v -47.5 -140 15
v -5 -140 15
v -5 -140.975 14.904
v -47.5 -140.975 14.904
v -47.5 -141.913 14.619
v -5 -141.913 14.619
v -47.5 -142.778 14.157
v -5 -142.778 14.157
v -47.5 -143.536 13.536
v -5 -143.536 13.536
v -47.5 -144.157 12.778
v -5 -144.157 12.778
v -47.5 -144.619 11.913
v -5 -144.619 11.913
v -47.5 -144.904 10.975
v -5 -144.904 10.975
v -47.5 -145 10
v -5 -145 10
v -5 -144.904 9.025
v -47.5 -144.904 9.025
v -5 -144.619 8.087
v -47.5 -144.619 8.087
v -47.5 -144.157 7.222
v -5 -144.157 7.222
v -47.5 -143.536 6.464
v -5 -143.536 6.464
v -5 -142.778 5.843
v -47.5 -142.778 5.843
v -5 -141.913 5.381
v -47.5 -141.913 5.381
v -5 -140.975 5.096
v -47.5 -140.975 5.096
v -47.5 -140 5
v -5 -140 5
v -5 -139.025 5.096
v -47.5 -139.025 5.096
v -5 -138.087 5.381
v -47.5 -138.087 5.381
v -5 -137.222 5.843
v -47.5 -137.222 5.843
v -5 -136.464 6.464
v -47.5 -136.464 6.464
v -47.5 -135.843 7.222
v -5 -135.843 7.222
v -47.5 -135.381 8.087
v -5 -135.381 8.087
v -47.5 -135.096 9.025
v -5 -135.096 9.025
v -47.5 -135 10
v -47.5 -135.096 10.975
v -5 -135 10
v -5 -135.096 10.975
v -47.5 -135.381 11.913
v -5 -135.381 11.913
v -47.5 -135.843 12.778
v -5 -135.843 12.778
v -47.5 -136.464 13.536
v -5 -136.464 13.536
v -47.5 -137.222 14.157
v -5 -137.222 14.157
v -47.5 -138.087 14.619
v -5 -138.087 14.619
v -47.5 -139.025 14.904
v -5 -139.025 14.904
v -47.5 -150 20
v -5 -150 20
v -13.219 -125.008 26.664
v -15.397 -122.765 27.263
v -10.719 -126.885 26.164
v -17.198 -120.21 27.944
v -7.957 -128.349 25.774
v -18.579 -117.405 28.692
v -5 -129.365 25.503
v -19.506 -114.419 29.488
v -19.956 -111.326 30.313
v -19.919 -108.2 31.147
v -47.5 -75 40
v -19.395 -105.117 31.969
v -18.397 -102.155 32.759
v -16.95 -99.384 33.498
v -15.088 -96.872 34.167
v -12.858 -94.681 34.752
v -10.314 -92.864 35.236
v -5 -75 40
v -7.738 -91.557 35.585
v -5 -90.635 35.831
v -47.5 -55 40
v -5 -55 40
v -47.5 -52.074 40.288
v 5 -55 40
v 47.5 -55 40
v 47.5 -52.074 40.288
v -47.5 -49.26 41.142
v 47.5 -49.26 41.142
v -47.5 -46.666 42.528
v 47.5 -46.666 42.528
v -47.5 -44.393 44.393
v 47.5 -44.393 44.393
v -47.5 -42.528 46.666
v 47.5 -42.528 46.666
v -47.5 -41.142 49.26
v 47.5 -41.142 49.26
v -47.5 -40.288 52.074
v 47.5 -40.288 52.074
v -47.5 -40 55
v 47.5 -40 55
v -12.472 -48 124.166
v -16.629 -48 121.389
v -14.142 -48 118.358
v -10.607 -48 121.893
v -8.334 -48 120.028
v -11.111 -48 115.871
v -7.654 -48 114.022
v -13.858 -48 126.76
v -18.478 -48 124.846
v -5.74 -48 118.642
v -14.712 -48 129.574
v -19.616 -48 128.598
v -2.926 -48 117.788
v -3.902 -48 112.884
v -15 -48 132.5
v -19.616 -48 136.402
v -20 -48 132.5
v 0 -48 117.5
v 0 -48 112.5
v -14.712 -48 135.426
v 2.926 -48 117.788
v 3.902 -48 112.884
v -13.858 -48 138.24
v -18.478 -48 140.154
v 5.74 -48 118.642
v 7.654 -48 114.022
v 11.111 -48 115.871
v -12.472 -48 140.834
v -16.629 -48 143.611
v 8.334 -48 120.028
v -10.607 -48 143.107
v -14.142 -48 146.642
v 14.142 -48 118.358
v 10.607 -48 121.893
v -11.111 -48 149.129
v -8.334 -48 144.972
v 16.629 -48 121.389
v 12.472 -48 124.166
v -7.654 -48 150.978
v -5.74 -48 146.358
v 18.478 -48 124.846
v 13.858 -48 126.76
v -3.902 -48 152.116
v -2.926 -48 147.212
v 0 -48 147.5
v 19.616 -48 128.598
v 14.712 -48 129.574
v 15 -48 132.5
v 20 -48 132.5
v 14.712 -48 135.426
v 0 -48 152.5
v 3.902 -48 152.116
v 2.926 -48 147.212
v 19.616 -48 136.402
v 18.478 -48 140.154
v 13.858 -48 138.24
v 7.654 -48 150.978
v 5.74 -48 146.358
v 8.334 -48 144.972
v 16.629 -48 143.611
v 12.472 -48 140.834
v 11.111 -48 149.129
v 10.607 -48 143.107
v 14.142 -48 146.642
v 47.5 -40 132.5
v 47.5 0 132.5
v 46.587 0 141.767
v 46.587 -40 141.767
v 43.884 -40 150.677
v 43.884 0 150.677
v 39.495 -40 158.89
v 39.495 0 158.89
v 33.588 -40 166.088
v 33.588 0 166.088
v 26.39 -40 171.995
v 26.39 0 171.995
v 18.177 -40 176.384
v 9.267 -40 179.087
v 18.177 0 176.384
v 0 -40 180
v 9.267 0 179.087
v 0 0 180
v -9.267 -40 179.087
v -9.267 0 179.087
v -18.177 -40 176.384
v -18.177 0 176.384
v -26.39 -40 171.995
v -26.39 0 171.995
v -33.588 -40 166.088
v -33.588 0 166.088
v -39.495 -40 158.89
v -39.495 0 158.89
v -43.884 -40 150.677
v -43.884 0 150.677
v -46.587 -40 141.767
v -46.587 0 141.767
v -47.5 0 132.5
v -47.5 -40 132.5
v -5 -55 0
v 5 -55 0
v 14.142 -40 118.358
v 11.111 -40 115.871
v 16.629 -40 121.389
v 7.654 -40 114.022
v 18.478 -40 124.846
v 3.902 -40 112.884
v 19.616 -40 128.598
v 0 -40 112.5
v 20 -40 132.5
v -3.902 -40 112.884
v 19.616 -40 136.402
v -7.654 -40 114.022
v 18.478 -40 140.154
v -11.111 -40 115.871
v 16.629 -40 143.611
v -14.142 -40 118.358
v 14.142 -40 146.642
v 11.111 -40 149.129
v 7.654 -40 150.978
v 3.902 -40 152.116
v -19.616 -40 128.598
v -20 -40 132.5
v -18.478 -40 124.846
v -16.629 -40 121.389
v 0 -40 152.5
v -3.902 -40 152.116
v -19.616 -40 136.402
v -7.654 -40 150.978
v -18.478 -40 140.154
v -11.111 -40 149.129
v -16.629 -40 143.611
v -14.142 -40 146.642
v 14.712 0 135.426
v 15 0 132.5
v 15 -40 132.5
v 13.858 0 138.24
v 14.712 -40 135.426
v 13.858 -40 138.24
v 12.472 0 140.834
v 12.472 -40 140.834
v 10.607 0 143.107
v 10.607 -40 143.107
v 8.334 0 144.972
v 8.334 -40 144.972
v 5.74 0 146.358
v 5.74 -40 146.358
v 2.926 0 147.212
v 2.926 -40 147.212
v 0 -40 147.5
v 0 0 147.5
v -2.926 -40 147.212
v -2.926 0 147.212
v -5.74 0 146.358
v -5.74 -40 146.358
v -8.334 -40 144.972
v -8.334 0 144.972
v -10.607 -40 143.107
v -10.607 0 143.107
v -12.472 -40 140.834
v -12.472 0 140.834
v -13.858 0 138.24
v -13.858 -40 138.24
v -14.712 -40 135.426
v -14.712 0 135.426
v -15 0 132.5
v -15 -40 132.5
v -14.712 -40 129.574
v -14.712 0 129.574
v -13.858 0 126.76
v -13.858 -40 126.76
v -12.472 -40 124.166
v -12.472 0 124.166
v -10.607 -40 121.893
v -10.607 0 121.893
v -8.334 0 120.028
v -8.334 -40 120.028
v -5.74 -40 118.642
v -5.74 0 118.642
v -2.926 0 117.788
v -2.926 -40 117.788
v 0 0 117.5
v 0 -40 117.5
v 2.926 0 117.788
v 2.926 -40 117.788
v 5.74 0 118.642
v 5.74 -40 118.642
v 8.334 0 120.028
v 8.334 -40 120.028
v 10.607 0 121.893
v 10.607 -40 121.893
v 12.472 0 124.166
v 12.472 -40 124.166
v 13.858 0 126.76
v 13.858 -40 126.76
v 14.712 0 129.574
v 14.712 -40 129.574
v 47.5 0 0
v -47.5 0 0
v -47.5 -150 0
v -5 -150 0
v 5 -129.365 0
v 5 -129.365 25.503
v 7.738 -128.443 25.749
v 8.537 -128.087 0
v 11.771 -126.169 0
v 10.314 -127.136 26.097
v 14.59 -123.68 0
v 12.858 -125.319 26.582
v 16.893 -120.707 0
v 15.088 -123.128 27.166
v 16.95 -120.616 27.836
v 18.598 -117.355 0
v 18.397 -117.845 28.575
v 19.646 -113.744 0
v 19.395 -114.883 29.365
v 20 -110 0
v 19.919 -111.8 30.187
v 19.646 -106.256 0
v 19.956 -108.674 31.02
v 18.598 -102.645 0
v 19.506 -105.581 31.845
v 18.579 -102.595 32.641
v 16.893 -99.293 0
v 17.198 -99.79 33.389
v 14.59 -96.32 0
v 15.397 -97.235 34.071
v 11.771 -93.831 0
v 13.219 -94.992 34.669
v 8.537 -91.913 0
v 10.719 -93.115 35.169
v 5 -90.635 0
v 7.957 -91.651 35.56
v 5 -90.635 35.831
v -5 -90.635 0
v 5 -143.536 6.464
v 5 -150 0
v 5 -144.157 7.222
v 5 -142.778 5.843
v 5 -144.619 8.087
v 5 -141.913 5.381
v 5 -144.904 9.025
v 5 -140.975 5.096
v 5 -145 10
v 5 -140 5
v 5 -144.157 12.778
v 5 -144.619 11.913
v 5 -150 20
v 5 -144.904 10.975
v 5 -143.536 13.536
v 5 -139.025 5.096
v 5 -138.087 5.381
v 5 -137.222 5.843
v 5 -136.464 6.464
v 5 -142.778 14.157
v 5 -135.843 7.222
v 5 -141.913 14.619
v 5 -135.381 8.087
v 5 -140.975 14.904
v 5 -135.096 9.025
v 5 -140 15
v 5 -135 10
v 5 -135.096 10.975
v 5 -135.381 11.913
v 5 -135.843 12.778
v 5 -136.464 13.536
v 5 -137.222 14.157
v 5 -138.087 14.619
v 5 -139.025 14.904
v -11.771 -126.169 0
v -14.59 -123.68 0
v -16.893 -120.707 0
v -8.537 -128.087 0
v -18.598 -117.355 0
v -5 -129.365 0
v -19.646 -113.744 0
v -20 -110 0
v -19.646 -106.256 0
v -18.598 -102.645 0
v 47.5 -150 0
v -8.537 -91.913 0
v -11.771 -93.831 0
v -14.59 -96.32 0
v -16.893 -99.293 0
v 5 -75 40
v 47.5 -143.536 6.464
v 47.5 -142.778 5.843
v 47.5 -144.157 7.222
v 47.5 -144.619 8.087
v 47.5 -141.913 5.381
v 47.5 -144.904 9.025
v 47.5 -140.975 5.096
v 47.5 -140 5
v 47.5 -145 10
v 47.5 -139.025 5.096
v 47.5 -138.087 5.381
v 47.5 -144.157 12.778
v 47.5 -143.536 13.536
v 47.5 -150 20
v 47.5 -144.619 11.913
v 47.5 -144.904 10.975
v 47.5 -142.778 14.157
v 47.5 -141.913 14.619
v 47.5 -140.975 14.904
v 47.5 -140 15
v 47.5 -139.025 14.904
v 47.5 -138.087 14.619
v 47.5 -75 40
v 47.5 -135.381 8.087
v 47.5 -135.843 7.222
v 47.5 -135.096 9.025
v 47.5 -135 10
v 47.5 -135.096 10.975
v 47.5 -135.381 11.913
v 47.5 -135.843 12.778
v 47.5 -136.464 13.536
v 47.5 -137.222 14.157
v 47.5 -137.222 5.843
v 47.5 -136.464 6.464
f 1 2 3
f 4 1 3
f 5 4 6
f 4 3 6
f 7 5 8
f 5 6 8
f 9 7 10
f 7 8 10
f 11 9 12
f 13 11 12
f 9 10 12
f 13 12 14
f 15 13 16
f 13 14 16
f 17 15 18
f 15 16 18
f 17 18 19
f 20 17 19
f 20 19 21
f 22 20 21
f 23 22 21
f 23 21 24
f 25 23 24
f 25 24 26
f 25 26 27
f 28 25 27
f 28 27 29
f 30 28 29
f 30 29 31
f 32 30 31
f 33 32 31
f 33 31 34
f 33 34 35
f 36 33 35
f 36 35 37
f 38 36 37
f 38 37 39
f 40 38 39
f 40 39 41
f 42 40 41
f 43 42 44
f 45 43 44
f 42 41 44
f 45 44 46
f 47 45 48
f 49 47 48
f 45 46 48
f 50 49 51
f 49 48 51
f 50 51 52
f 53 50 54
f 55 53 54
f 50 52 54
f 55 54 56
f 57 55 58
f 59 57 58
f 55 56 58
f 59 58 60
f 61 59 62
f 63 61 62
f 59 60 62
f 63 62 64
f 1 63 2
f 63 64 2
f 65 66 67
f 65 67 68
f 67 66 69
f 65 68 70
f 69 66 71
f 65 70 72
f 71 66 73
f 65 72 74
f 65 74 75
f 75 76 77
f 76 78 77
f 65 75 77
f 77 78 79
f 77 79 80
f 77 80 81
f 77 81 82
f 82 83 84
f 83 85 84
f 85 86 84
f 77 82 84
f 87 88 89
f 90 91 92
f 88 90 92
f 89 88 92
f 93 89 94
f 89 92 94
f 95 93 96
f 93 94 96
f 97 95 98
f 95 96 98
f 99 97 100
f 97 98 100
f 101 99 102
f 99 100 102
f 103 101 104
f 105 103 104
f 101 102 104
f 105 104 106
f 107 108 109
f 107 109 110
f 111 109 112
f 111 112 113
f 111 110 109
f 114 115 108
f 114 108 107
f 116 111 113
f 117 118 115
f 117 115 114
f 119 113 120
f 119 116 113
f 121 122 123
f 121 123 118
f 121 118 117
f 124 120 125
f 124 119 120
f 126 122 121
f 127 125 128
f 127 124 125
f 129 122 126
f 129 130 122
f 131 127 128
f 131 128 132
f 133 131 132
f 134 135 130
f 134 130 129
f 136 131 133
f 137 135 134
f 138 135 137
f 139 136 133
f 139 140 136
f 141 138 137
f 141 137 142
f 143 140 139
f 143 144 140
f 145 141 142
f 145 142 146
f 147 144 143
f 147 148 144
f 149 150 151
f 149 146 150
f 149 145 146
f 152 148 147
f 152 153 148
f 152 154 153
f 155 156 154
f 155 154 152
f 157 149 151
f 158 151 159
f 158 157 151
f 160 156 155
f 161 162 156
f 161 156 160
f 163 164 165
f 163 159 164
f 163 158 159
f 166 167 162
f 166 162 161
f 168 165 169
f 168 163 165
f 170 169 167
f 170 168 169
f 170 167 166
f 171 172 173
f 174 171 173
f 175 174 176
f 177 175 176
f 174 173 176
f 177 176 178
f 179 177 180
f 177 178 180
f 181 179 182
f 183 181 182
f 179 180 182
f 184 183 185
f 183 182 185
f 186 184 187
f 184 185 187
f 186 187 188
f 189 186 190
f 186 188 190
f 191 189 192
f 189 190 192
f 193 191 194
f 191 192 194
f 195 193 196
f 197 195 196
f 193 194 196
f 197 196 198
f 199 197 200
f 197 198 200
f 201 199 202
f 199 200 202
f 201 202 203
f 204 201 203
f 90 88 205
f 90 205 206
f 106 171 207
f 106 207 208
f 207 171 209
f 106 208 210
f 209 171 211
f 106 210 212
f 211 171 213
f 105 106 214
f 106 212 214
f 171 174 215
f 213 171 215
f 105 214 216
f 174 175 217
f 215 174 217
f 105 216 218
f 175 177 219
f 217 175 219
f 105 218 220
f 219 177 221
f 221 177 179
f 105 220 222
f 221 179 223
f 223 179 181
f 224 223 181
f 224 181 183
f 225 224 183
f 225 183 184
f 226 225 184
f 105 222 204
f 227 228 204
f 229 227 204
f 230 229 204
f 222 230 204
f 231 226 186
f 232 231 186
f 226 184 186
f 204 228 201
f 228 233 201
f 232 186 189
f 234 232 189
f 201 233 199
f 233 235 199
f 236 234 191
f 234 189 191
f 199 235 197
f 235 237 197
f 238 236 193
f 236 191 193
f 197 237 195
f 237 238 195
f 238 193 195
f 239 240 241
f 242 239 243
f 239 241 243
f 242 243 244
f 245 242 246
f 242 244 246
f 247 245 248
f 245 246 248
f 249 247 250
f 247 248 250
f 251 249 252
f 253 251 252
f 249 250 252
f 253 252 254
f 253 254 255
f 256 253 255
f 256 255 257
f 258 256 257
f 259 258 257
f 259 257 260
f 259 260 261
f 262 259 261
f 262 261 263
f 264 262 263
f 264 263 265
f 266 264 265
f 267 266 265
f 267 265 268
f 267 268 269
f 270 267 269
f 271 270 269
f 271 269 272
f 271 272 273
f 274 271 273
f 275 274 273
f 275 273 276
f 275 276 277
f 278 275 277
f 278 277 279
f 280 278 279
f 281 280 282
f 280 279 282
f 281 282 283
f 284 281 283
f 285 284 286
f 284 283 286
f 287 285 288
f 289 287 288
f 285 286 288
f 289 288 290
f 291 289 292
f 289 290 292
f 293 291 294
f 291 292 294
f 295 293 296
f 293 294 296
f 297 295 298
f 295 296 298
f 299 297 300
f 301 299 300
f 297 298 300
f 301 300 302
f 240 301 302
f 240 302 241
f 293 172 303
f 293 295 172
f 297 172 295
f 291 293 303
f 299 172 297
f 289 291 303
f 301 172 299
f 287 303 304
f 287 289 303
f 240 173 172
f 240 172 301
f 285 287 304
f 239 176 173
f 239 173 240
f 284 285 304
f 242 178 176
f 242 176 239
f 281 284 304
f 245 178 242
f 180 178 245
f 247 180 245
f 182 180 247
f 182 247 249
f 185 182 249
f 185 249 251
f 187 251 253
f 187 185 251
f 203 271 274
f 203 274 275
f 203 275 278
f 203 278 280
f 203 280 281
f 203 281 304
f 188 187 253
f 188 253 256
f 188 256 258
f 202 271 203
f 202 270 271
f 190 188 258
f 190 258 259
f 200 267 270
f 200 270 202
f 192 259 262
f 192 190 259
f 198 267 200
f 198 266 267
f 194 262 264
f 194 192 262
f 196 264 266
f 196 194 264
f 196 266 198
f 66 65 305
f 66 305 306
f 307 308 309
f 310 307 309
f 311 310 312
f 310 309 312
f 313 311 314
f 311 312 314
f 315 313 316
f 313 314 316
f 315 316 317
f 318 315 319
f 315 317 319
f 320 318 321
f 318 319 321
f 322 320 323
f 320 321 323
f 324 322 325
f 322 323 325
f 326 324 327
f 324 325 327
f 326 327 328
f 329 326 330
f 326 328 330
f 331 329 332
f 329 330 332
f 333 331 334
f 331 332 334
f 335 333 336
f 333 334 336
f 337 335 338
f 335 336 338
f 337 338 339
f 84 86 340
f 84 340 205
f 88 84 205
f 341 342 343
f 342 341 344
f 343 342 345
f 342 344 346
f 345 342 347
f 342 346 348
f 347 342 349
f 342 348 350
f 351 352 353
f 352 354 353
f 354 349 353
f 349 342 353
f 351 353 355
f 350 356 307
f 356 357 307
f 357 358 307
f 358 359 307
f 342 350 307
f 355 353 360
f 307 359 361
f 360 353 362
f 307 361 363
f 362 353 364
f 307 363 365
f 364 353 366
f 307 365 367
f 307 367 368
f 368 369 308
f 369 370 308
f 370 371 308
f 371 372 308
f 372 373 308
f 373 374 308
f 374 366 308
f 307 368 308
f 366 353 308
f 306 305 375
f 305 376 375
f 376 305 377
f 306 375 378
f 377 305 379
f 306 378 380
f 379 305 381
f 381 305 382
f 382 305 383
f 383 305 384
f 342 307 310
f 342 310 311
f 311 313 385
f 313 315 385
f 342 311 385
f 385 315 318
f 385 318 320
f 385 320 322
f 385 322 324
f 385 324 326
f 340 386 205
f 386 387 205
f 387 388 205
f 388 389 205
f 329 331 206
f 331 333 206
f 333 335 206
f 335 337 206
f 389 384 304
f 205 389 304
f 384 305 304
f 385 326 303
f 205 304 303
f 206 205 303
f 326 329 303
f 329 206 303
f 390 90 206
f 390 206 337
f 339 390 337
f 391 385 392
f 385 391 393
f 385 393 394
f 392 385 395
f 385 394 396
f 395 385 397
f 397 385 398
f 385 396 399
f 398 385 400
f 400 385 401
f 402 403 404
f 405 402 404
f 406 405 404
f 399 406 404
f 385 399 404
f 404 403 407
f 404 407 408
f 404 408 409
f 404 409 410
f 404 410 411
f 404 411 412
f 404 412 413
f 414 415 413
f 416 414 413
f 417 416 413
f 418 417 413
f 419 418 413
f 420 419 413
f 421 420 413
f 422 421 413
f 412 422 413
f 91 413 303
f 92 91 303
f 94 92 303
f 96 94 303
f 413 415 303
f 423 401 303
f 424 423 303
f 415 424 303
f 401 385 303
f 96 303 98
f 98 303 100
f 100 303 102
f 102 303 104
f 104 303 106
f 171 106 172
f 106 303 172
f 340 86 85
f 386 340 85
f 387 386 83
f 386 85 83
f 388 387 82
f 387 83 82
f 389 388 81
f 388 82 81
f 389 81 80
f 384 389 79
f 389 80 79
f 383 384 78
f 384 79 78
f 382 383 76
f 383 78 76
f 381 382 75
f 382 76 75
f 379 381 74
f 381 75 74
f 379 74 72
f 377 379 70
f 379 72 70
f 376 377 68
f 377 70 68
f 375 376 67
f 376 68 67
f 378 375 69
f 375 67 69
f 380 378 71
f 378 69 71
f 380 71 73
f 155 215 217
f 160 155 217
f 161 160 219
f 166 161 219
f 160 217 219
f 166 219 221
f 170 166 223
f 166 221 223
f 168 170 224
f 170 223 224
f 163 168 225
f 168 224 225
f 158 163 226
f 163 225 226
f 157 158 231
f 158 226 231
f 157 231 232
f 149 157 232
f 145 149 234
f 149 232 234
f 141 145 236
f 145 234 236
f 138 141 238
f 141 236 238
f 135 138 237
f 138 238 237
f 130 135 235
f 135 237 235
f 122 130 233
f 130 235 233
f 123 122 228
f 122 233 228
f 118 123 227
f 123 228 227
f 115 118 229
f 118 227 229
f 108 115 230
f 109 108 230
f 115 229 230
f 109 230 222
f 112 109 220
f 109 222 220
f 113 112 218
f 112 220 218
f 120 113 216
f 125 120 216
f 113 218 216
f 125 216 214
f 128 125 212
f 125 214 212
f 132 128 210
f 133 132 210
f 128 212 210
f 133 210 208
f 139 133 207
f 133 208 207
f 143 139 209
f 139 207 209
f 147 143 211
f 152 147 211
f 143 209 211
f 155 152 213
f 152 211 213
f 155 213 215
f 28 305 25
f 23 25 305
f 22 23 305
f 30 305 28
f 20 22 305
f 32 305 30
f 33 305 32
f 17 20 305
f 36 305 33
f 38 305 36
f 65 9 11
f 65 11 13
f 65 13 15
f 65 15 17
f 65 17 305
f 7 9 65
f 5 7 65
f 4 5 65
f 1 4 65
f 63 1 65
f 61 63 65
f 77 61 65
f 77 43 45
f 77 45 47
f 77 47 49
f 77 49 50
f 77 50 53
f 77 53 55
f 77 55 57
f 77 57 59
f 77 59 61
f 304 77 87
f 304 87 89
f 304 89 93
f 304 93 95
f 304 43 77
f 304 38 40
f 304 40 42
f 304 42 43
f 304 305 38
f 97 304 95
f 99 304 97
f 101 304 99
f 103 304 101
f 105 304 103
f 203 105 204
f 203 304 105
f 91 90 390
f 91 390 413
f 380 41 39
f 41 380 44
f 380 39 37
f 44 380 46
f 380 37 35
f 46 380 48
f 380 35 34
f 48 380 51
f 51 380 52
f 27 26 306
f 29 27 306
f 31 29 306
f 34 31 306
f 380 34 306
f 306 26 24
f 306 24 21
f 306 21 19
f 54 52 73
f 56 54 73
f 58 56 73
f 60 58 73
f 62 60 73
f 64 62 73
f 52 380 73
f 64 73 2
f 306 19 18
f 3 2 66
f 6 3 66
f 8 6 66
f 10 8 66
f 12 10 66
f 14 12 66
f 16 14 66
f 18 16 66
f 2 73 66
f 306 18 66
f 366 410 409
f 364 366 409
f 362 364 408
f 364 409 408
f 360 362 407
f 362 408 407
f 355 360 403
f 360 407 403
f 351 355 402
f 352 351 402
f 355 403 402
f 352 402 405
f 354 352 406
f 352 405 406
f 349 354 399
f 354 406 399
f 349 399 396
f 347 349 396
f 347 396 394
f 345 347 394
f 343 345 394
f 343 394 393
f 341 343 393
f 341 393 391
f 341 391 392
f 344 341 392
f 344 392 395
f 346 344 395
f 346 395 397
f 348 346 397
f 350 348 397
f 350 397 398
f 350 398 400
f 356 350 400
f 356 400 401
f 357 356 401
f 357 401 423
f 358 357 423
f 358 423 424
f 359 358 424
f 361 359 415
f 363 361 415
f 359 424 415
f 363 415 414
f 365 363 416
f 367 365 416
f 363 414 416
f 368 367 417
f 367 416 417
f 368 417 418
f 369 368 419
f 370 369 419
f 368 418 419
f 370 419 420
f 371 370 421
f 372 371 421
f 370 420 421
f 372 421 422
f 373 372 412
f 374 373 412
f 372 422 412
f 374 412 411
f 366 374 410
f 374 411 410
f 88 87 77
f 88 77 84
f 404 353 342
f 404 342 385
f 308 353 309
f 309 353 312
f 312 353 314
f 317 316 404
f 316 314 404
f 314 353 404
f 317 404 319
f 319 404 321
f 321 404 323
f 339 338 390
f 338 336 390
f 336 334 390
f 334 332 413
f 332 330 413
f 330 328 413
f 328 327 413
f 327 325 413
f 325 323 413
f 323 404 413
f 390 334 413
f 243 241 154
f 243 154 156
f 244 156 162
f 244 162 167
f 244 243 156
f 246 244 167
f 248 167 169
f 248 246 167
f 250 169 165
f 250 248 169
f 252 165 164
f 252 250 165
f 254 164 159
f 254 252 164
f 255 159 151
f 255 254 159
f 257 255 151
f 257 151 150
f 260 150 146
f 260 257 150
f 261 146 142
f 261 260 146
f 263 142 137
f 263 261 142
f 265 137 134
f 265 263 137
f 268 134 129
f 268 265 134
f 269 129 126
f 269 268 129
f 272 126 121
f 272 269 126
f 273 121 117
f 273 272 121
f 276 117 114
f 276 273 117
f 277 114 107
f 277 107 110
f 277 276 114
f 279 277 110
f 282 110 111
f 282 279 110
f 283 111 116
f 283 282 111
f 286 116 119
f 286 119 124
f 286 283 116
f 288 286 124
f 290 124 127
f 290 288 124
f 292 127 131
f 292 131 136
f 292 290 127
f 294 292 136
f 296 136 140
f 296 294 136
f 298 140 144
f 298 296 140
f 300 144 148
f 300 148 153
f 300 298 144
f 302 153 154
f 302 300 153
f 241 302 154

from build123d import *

# Parameters (mm, degrees)
PAD_DEPTH       = 40
SKETCH001_W     = 95
SKETCH001_H     = 40
PAD001_DEPTH    = 110
SKETCH002_R     = 20
SKETCH002_R_2   = 15
PAD002_DEPTH    = 8
SKETCH003_R     = 15
POCKET_DEPTH    = 40.001
FILLET_R        = 15
POCKET001_DEPTH = 40.001
POCKET002_DEPTH = 95.001
SKETCH006_R     = 5
POCKET003_DEPTH = 95.001


with BuildPart() as part:
    # Sketch → Pad (new body)
    with BuildSketch(Plane.XZ):
        with BuildLine():
            Line((47.5, 132.49995), (47.5, 0))
            Line((47.5, 0), (-47.5, 0))
            Line((-47.5, 0), (-47.5, 132.49995))
            ThreePointArc((47.5, 132.49995), (0, 180), (-47.5, 132.49995))
        make_face()
    extrude(amount=PAD_DEPTH)

    # Sketch001 → Pad001 (new body)
    with BuildSketch(Plane.XZ.offset(40)):
        with Locations((0, 20)):
            Rectangle(SKETCH001_W, SKETCH001_H)
    extrude(amount=PAD001_DEPTH)

    # Sketch002 → Pad002 (new body)
    with BuildSketch(Plane.XZ.offset(40)):
        with Locations((0, 132.5)):
            Circle(SKETCH002_R)
        with Locations((0, 132.5)):
            Circle(SKETCH002_R_2, mode=Mode.SUBTRACT)
    extrude(amount=PAD002_DEPTH)

    # Sketch003 → Pocket (cut, through all)
    with BuildSketch(Plane.XZ.offset(40)):
        with Locations((0, 132.5)):
            Circle(SKETCH003_R)
    extrude(amount=-POCKET_DEPTH, mode=Mode.SUBTRACT)

    # Fillet
    fillet_edges = [part.edges().sort_by_distance(p)[0] for p in [
        (0, -40, 40),
    ]]
    fillet(fillet_edges, radius=FILLET_R)

    # Sketch004 → Pocket001 (cut, through all)
    with BuildSketch(Plane(origin=(0, 0, 40), x_dir=(-1, 0, 0), z_dir=(0, 0, 1))):
        with BuildLine():
            ThreePointArc((-5, 129.364917), (-20, 110), (-5, 90.635083))
            Line((-5, 55), (-5, 90.635083))
            Line((5, 55), (-5, 55))
            Line((5, 90.635083), (5, 55))
            ThreePointArc((5, 90.635083), (20, 110), (5, 129.364917))
            Line((5, 129.364917), (5, 150))
            Line((5, 150), (-5, 150))
            Line((-5, 150), (-5, 129.364917))
        make_face()
    extrude(amount=-POCKET001_DEPTH, mode=Mode.SUBTRACT)

    # Sketch005 → Pocket002 (cut, through all)
    with BuildSketch(Plane(origin=(47.5, 0, 0), x_dir=(0, 0, 1), z_dir=(1, 0, 0))):
        Polygon((40, 150), (20, 150), (40, 75), align=None)
    extrude(amount=-POCKET002_DEPTH, mode=Mode.SUBTRACT)

    # Sketch006 → Pocket003 (cut, through all)
    with BuildSketch(Plane(origin=(47.5, 0, 0), x_dir=(0, 0, 1), z_dir=(1, 0, 0))):
        with Locations((10, 140)):
            Circle(SKETCH006_R)
    extrude(amount=-POCKET003_DEPTH, mode=Mode.SUBTRACT)


solid = part.part
